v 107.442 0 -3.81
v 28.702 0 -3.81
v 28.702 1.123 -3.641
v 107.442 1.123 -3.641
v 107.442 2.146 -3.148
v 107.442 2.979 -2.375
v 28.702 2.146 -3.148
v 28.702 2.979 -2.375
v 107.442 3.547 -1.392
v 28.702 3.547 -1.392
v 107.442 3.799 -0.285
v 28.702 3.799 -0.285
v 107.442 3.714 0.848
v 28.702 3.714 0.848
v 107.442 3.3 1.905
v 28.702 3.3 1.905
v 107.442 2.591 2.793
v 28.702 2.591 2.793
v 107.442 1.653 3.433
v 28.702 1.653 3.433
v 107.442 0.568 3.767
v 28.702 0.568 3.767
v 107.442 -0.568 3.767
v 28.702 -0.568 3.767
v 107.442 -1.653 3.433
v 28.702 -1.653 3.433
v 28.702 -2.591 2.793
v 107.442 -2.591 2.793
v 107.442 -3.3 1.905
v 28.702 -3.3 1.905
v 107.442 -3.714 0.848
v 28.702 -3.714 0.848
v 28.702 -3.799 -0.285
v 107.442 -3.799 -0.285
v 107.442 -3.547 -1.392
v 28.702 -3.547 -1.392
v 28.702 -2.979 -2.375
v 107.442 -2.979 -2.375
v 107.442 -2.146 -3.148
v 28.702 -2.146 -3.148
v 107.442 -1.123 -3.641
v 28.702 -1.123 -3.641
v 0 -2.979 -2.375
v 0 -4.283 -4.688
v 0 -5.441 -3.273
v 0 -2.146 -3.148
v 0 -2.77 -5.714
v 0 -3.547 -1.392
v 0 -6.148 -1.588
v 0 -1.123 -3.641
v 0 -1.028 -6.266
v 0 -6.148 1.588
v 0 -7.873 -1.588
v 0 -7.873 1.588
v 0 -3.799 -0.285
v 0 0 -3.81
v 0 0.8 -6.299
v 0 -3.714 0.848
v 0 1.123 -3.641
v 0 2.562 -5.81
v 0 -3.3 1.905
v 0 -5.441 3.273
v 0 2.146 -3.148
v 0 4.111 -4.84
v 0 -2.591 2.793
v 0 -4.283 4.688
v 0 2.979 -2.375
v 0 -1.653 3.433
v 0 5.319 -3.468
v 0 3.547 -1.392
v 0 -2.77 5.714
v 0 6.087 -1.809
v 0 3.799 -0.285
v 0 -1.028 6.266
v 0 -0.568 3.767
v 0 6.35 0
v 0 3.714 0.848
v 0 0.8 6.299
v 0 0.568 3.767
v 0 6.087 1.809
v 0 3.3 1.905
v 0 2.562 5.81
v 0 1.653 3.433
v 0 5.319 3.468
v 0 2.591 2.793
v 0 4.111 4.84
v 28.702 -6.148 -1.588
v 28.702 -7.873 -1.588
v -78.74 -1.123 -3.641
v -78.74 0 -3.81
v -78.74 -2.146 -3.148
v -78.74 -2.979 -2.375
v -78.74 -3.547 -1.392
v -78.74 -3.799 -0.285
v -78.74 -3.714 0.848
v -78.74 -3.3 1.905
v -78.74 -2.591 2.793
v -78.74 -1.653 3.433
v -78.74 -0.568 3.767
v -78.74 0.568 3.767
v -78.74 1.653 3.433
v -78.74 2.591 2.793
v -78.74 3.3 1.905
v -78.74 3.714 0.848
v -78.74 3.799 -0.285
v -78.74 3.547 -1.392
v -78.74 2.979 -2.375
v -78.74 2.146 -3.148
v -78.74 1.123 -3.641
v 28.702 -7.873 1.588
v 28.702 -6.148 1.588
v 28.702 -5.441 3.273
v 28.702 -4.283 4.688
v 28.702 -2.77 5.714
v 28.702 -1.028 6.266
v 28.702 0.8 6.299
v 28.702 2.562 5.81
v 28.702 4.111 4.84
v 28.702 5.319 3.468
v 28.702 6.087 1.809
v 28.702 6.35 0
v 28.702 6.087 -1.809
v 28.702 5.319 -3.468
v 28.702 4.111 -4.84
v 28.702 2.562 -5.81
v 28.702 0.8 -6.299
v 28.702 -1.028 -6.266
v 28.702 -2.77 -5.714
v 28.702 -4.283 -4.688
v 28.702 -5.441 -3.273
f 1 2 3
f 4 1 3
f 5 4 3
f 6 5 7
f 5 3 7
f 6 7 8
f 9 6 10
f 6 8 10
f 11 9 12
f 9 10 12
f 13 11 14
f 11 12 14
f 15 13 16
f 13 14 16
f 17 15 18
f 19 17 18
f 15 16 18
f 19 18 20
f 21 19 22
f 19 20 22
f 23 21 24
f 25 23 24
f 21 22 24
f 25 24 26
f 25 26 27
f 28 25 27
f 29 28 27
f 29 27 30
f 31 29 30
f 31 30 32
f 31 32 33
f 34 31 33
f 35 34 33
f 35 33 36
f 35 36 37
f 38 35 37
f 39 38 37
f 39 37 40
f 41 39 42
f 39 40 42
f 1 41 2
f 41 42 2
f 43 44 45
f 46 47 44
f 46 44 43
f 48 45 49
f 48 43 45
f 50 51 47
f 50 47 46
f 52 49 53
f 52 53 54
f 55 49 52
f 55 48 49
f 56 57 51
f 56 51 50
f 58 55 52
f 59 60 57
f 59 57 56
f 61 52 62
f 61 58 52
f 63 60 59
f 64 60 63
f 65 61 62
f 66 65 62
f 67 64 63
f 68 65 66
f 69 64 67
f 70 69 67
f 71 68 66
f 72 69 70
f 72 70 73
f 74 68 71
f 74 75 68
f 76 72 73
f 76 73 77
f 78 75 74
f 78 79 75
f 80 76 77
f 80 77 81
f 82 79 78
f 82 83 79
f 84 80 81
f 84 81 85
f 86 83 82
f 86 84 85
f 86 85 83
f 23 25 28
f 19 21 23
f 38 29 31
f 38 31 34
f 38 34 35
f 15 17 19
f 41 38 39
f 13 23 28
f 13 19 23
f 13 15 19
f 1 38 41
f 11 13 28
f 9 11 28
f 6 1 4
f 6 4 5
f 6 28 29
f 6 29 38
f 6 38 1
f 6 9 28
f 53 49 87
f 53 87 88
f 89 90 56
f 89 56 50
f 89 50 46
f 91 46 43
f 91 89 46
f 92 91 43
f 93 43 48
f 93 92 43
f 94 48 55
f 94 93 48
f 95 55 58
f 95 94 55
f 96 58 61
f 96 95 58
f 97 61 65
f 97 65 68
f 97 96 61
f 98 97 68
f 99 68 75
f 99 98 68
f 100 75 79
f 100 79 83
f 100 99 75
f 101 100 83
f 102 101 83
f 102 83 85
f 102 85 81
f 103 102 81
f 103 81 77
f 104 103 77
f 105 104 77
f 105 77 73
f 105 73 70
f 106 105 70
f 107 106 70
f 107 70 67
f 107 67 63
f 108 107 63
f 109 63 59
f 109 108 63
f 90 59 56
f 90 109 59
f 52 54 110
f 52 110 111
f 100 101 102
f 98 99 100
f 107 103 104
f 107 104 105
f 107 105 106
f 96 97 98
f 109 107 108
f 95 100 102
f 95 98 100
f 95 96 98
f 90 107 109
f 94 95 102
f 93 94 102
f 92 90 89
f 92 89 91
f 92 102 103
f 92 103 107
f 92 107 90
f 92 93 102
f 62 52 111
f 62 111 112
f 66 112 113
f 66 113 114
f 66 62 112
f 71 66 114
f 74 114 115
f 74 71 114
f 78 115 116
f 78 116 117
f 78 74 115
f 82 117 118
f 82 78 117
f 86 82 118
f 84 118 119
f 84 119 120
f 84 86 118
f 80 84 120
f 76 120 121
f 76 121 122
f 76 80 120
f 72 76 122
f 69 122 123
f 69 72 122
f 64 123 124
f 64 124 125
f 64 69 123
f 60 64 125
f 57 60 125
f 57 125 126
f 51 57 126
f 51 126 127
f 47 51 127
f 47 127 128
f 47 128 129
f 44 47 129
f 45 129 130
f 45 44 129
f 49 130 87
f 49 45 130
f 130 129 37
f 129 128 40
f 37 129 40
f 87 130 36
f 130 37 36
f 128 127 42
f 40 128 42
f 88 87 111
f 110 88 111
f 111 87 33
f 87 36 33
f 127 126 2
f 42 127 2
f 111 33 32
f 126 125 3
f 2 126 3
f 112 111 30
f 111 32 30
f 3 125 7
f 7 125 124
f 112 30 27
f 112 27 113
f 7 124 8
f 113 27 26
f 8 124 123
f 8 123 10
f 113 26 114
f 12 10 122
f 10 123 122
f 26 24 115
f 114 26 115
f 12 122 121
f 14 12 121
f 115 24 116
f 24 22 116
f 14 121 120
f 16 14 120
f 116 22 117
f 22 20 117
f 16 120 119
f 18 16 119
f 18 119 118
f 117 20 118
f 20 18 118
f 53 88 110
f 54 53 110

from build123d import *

# Parameters (mm, degrees)
BOSS_EXTRUDE1_DEPTH = 28.702
SKETCH3_R           = 3.81
BOSS_EXTRUDE3_DEPTH = 78.74
BOSS_EXTRUDE4_START = 78.74
SKETCH4_R           = 3.81
BOSS_EXTRUDE4_DEPTH = 78.74


with BuildPart() as part:
    # Sketch1 → Boss-Extrude1 (new body)
    with BuildSketch(Plane(origin=(0, 0, 0), x_dir=(0, 0, -1), z_dir=(1, 0, 0))):
        with BuildLine():
            Line((1.5875, -6.148361062), (1.5875, -7.873021062))
            Line((1.5875, -7.873021062), (-1.5875, -7.873021062))
            Line((-1.5875, -7.873021062), (-1.5875, -6.148361062))
            ThreePointArc((-1.5875, -6.148361062), (0, 6.35), (1.5875, -6.148361062))
        make_face()
    extrude(amount=BOSS_EXTRUDE1_DEPTH)

    # Sketch3 → Boss-Extrude3 (add)
    with BuildSketch(Plane(origin=(28.702, 0, 0), x_dir=(0, 0, -1), z_dir=(1, 0, 0))):
        Circle(SKETCH3_R)
    extrude(amount=BOSS_EXTRUDE3_DEPTH)

    # Sketch4 → Boss-Extrude4 (add)
    with BuildSketch(Plane.ZY.offset(BOSS_EXTRUDE4_START)):
        with Locations(Location((0, 0, 0), (0, 0, 180))):
            Circle(SKETCH4_R)
    extrude(amount=-BOSS_EXTRUDE4_DEPTH)


solid = part.part
